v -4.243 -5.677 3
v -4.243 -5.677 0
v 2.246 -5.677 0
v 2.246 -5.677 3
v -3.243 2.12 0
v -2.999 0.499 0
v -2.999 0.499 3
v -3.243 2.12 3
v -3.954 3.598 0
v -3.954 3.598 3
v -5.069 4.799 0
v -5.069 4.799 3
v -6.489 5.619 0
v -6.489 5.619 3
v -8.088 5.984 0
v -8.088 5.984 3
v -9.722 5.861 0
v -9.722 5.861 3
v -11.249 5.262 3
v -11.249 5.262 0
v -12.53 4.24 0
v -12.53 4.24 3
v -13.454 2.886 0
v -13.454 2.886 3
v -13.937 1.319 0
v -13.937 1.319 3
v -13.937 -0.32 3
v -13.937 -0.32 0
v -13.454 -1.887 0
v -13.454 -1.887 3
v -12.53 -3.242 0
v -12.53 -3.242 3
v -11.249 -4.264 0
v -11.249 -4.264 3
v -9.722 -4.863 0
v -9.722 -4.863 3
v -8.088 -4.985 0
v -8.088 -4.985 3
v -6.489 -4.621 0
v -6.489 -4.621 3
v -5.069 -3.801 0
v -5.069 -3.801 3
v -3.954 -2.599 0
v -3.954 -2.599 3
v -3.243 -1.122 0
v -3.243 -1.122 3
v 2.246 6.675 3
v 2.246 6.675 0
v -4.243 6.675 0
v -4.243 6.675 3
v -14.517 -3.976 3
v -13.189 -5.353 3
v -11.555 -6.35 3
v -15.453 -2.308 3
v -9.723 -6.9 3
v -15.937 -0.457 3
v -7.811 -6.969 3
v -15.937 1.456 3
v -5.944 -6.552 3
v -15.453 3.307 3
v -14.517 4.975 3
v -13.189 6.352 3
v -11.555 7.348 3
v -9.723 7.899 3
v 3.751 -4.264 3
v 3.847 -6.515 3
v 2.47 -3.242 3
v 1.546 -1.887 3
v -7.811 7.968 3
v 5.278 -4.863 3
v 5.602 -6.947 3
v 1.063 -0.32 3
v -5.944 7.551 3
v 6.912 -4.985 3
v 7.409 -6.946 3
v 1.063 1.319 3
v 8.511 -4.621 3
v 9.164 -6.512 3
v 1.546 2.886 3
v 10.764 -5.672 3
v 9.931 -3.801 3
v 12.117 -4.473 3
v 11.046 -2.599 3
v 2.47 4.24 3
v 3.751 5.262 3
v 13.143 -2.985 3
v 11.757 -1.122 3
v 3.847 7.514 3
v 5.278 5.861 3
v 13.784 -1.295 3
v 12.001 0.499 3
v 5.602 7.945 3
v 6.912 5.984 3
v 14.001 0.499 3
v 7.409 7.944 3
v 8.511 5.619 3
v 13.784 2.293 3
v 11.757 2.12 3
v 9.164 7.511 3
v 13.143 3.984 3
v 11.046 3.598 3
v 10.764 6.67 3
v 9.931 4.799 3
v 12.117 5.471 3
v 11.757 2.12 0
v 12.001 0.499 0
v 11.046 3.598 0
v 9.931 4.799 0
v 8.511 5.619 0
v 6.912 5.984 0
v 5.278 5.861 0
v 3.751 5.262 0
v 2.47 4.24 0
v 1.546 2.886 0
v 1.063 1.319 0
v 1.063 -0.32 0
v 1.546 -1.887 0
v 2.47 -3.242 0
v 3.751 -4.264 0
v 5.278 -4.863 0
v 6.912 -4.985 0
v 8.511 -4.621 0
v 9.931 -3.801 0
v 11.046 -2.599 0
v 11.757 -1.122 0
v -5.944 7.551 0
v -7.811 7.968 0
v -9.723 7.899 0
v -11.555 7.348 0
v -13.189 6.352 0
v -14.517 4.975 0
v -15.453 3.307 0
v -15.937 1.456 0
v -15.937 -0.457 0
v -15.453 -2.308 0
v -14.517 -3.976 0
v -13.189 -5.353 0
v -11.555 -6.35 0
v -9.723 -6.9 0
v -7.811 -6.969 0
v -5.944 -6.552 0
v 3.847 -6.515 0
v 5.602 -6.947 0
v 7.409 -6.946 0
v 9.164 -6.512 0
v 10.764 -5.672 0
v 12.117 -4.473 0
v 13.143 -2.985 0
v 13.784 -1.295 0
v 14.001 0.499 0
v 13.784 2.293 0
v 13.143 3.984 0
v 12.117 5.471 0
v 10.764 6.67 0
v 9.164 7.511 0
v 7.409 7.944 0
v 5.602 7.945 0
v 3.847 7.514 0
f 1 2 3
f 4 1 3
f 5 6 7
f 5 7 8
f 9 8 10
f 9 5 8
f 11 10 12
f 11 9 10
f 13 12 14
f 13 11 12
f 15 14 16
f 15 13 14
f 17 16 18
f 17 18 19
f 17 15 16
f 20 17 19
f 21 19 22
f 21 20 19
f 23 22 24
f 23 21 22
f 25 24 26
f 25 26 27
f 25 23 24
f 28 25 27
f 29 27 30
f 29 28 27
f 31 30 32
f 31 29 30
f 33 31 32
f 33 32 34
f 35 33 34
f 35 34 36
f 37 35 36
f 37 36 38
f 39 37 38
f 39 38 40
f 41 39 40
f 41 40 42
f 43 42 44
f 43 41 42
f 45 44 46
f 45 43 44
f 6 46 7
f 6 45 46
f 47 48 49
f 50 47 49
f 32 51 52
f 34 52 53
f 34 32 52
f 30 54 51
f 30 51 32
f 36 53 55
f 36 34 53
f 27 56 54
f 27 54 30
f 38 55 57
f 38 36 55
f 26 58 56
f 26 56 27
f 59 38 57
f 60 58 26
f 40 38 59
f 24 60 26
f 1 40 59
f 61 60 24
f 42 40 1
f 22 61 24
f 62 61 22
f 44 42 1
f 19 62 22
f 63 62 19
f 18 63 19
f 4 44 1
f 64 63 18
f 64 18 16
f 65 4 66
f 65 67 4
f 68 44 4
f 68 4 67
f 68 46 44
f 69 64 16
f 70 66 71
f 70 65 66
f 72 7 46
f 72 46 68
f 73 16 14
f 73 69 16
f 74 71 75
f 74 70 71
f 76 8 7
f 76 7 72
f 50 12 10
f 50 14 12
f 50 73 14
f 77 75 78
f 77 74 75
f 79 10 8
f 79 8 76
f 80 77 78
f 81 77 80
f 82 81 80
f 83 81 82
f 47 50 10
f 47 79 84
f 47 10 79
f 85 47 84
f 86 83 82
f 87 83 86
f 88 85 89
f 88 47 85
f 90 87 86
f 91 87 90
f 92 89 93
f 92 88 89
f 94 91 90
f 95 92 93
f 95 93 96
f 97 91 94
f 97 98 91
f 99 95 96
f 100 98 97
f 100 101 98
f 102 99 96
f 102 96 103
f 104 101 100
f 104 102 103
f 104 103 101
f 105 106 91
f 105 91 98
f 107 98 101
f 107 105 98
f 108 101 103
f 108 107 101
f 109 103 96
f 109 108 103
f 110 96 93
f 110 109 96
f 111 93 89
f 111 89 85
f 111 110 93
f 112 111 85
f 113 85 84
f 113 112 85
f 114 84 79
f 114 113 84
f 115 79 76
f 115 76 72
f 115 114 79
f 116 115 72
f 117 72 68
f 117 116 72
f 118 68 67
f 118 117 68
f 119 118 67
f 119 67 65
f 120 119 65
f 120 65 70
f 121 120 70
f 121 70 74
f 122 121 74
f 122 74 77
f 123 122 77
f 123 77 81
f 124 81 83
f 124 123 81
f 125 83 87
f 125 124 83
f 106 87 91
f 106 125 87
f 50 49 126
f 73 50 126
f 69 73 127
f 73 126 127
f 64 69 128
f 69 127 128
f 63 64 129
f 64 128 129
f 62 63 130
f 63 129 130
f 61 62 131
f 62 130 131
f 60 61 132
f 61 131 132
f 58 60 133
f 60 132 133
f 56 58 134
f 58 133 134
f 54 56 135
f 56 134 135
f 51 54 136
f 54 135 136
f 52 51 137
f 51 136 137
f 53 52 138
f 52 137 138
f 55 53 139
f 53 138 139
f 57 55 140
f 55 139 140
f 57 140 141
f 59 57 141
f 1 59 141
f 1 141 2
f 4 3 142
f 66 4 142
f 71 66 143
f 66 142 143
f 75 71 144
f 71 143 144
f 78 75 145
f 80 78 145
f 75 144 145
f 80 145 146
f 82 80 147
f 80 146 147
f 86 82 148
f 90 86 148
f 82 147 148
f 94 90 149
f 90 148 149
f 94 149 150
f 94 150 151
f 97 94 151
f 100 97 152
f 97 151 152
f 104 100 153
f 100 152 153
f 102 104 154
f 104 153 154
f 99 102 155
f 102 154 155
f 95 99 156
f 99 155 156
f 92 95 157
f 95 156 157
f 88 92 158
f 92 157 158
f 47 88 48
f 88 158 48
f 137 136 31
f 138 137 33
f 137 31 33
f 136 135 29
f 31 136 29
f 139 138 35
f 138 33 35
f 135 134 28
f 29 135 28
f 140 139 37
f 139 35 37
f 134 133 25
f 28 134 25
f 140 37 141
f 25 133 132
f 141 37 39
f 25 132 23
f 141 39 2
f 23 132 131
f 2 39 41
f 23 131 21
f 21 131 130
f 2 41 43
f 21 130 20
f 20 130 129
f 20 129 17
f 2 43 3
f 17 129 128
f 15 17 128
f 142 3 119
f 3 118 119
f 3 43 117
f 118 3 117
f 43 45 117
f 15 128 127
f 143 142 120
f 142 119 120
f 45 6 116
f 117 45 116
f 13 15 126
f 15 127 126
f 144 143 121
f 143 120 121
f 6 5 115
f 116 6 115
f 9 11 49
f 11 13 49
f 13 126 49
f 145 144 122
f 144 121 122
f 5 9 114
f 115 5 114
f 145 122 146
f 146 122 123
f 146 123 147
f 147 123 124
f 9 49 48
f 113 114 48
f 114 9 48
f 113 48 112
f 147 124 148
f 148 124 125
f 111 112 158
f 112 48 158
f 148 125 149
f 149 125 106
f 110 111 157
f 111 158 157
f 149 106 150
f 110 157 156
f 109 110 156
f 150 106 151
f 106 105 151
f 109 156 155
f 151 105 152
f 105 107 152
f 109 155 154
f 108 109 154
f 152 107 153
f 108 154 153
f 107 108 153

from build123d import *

# Parameters (mm, degrees)
F0_R     = 5.5
F1_DEPTH = 3


with BuildPart() as f1:
    # F0 (on Top) → F1 (new body)
    with BuildSketch(Plane.XY):
        with BuildLine():
            ThreePointArc((-0.99853, 0.499257), (-1.858995, 3.987319), (-4.24295, 6.675019))
            ThreePointArc((-4.24295, 6.675019), (-15.99853, 0.499257), (-4.24295, -5.676504))
            ThreePointArc((-4.24295, -5.676504), (-1.858995, -2.988804), (-0.99853, 0.499257))
        make_face()
        with Locations((-8.49853, 0.499257)):
            Circle(F0_R, mode=Mode.SUBTRACT)
        with BuildLine():
            Line((2.245889, 6.675019), (-4.24295, 6.675019))
            ThreePointArc((-4.24295, 6.675019), (-1.858995, 3.987319), (-0.99853, 0.499257))
            ThreePointArc((-0.99853, 0.499257), (-0.138066, 3.987319), (2.245889, 6.675019))
        make_face()
        with BuildLine():
            ThreePointArc((2.245889, -5.676504), (-0.138066, -2.988804), (-0.99853, 0.499257))
            ThreePointArc((-0.99853, 0.499257), (-1.858995, -2.988804), (-4.24295, -5.676504))
            Line((-4.24295, -5.676504), (2.245889, -5.676504))
        make_face()
        with BuildLine():
            ThreePointArc((14.00147, 0.499257), (9.989531, 7.138793), (2.245889, 6.675019))
            ThreePointArc((2.245889, 6.675019), (-0.138066, 3.987319), (-0.99853, 0.499257))
            ThreePointArc((-0.99853, 0.499257), (-0.138066, -2.988804), (2.245889, -5.676504))
            ThreePointArc((2.245889, -5.676504), (9.989531, -6.140278), (14.00147, 0.499257))
        make_face()
        with Locations((6.50147, 0.499257)):
            Circle(F0_R, mode=Mode.SUBTRACT)
    extrude(amount=F1_DEPTH)


solid = f1.part
